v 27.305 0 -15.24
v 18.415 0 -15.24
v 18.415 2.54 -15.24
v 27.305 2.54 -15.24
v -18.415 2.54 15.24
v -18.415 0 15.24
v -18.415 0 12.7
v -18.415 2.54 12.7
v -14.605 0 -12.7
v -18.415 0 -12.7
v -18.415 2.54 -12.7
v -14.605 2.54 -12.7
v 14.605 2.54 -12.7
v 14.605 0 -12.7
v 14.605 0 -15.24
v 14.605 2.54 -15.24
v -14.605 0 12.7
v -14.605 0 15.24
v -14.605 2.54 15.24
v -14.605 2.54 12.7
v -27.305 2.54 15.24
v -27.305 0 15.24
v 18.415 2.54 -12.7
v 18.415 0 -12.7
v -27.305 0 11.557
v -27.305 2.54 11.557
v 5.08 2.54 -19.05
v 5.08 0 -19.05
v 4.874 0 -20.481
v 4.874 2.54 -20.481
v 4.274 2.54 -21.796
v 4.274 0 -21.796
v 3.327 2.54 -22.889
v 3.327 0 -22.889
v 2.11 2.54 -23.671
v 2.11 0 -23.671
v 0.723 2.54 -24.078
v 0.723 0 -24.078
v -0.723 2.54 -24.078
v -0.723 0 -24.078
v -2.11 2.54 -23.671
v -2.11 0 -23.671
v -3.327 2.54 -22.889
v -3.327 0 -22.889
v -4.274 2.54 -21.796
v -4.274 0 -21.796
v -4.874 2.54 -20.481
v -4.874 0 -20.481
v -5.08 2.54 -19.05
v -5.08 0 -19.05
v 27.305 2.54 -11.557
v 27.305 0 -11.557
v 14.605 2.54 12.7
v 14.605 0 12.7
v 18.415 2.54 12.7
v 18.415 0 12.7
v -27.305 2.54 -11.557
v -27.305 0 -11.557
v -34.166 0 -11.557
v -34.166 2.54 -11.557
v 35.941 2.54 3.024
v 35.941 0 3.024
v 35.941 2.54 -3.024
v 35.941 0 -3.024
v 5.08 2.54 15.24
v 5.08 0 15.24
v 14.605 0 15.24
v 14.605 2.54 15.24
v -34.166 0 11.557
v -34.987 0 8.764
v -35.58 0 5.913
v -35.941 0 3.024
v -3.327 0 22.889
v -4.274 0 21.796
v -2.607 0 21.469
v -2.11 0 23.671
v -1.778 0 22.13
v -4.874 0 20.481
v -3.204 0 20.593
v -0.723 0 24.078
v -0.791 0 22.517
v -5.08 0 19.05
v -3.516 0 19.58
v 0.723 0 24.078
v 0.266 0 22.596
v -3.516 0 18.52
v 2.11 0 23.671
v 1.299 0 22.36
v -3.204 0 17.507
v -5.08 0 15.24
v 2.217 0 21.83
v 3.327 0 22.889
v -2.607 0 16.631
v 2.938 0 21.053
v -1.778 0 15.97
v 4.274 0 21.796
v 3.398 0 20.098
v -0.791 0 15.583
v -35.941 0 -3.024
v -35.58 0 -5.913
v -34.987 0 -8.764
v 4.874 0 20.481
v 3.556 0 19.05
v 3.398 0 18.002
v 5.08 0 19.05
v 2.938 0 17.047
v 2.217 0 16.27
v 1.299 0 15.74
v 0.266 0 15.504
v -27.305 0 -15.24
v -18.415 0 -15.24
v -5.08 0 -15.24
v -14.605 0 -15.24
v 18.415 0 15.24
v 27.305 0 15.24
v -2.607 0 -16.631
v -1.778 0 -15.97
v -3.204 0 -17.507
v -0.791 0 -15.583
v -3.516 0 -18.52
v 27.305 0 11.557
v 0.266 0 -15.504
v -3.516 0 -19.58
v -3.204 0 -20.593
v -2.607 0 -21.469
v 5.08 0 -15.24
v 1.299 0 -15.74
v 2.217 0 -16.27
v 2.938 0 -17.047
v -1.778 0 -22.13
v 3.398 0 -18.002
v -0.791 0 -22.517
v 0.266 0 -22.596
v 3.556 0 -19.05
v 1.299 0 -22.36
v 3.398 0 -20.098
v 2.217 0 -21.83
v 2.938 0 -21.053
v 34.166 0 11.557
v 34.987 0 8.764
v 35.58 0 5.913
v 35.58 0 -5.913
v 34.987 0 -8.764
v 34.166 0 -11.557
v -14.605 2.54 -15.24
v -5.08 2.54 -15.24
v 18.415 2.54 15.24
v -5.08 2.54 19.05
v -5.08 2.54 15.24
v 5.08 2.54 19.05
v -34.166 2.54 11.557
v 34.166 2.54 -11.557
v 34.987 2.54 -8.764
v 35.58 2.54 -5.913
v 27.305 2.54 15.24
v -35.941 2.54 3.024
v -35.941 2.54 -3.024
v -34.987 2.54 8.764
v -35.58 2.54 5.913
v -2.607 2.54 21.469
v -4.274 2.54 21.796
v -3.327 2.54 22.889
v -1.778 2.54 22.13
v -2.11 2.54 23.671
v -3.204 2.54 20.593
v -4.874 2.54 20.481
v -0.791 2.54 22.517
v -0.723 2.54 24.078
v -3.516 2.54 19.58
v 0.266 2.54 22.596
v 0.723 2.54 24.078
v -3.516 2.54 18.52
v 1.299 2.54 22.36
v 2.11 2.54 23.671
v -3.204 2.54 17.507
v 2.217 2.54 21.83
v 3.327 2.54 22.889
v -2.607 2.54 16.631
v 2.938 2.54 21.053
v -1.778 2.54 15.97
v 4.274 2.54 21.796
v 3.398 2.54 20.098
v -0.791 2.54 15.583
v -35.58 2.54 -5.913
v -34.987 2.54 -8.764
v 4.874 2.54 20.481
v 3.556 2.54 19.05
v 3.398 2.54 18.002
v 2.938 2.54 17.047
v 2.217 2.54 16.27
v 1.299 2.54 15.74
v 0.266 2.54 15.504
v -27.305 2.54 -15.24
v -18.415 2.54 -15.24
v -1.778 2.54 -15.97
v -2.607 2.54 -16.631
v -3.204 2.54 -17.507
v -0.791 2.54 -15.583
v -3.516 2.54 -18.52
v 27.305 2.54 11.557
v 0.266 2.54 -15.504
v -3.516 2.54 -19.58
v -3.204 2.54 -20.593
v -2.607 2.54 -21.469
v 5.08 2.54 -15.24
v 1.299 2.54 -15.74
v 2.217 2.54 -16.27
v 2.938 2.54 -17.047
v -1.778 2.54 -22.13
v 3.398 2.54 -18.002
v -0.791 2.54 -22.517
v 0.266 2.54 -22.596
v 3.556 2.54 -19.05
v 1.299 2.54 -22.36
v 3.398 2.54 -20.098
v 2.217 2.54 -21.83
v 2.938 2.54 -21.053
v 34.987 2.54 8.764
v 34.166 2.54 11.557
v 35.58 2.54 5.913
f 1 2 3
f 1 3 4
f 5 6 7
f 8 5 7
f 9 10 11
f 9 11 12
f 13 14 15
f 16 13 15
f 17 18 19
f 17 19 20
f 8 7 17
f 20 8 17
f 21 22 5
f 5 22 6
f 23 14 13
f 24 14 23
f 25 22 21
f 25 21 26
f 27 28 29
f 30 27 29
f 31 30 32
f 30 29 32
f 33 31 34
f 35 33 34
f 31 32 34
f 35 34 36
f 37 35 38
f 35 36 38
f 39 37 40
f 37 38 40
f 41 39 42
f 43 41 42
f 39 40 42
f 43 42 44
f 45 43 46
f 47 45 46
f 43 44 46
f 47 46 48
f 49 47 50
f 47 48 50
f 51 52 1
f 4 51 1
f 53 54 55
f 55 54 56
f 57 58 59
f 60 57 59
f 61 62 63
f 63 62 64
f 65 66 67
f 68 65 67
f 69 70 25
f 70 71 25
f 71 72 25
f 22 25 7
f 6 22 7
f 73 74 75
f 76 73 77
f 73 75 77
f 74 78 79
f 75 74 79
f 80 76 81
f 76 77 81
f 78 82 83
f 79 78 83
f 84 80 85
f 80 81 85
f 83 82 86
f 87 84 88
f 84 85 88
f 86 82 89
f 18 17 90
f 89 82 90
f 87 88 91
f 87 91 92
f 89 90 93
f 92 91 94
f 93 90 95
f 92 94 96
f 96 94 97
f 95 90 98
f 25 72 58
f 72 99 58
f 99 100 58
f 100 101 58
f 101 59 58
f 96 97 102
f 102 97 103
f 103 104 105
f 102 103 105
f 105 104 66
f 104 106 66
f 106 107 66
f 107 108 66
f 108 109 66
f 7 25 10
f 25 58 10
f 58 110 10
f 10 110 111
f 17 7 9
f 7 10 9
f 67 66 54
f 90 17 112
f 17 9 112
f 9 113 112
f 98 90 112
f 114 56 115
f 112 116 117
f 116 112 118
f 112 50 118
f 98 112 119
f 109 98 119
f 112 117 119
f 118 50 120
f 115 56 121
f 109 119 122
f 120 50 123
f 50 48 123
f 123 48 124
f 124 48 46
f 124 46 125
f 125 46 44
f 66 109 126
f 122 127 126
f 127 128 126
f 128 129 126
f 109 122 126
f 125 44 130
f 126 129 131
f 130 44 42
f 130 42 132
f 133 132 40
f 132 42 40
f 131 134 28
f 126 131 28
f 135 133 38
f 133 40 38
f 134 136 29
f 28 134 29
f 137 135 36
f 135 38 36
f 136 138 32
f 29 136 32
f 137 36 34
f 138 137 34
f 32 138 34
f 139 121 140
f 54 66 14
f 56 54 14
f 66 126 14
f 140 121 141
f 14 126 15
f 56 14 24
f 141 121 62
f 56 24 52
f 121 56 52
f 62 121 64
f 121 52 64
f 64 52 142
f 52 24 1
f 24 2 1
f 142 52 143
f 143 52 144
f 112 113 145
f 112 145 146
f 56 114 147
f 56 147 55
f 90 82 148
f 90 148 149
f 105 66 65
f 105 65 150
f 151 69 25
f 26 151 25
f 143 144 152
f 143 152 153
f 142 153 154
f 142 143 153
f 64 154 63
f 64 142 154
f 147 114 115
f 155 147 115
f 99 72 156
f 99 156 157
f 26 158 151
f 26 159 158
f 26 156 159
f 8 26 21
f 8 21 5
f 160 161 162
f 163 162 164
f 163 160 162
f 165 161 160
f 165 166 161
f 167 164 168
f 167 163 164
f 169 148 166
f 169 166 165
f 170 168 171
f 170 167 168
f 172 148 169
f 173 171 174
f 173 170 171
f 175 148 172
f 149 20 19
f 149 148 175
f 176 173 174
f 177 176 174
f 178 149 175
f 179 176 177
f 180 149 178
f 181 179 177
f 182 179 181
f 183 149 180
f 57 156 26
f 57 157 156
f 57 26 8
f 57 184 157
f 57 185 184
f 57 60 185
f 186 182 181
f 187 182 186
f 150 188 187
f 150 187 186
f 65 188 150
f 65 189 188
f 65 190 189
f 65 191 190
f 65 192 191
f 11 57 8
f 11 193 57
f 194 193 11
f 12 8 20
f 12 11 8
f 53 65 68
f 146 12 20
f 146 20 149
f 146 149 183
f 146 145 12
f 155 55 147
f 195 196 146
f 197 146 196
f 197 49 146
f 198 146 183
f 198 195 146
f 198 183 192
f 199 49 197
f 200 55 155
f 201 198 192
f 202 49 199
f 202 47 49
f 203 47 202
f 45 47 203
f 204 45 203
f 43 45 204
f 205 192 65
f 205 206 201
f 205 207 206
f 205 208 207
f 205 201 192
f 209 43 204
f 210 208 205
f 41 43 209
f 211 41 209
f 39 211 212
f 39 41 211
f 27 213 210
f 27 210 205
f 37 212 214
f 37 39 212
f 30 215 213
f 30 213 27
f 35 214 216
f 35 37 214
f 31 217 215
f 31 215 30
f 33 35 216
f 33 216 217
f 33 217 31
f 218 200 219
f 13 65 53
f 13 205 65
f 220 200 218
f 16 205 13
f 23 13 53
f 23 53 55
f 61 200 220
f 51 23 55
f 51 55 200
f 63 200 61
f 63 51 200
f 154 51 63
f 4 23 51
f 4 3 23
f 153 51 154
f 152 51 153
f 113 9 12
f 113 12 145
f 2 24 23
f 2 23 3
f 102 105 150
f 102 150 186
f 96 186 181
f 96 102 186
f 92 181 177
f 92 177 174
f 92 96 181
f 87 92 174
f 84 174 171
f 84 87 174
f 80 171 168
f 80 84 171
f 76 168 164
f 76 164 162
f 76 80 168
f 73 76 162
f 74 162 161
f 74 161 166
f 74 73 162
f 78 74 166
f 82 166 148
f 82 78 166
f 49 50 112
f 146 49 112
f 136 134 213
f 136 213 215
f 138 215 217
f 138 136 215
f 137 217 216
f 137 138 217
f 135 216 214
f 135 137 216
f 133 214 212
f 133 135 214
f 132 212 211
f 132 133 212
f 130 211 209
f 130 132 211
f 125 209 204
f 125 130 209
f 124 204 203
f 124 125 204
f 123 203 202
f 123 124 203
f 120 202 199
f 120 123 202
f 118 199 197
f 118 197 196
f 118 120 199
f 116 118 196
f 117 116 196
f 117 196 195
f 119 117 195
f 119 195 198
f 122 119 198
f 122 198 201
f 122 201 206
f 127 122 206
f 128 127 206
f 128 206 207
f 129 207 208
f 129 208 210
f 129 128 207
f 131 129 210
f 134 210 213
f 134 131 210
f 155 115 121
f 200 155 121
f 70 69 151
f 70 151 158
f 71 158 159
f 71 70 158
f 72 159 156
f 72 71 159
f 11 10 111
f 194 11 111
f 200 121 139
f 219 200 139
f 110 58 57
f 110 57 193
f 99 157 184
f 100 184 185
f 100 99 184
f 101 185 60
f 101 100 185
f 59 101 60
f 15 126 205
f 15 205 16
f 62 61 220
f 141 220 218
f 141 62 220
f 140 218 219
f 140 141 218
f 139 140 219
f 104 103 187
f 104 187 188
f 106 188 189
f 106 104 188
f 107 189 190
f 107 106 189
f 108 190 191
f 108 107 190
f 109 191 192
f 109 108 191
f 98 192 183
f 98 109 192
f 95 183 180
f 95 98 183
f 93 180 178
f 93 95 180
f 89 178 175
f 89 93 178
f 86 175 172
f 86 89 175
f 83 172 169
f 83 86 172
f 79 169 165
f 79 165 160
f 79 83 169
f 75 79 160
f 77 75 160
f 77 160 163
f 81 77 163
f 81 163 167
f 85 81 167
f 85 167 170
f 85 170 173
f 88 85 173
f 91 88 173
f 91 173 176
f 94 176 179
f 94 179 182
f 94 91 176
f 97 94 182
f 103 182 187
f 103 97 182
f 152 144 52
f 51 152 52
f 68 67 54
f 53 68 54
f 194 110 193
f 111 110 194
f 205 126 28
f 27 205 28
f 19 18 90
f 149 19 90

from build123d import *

# Parameters (mm, degrees)
SKETCH1_W               = 54.61
SKETCH1_H               = 23.114
SKETCH1_W_2             = 8.636
SKETCH1_H_2             = 3.683
BOSS_EXTRUDE1_DEPTH     = 2.54
CUT_EXTRUDE1_DEPTH      = 3.54
CUT_EXTRUDE1_DEPTH_BACK = 1
SKETCH3_R               = 3.556
BOSS_EXTRUDE2_DEPTH     = 2.54
SKETCH4_W               = 3.81
SKETCH4_H               = 2.54
CUT_EXTRUDE3_DEPTH      = 3.54


with BuildPart() as part:
    # Sketch1 → Boss-Extrude1 (new body)
    with BuildSketch(Plane(origin=(0, 0, 0), x_dir=(1, 0, 0), z_dir=(0, 1, 0))):
        Rectangle(SKETCH1_W, SKETCH1_H)
        with Locations((-31.623, 0)):
            Rectangle(SKETCH1_W_2, SKETCH1_H)
        with Locations((31.623, 0)):
            Rectangle(SKETCH1_W_2, SKETCH1_H)
        with Locations((0, -13.3985)):
            Rectangle(SKETCH1_W, SKETCH1_H_2)
        with Locations((0, 13.3985)):
            Rectangle(SKETCH1_W, SKETCH1_H_2)
    extrude(amount=BOSS_EXTRUDE1_DEPTH)

    # Sketch2 → Cut-Extrude1 (cut, two sides)
    with BuildSketch(Plane(origin=(0, 0, 0), x_dir=(1, 0, 0), z_dir=(0, 1, 0))) as cut_extrude1_sk:
        with BuildLine():
            Line((-36.068, 36.068), (-36.068, -3.1e-08))
            ThreePointArc((-36.068, -3.1e-08), (-25.503927395, 25.503927373), (0, 36.068))
            Line((0, 36.068), (-36.068, 36.068))
        make_face()
        with BuildLine():
            ThreePointArc((0, 36.068), (25.503927384, 25.503927384), (36.068, 0))
            Line((36.068, 0), (36.068, 36.068))
            Line((36.068, 36.068), (0, 36.068))
        make_face()
        with BuildLine():
            ThreePointArc((36.068, 0), (25.503927365, -25.503927403), (-5.3e-08, -36.068))
            Line((-5.3e-08, -36.068), (36.068, -36.068))
            Line((36.068, -36.068), (36.068, 0))
        make_face()
        with BuildLine():
            Line((-36.068, -3.1e-08), (-36.068, -36.068))
            Line((-36.068, -36.068), (-5.3e-08, -36.068))
            ThreePointArc((-5.3e-08, -36.068), (-25.503927391, -25.503927376), (-36.068, -3.1e-08))
        make_face()
    extrude(amount=CUT_EXTRUDE1_DEPTH, mode=Mode.SUBTRACT)
    extrude(cut_extrude1_sk.sketch, amount=-CUT_EXTRUDE1_DEPTH_BACK, mode=Mode.SUBTRACT)

    # Sketch3 → Boss-Extrude2 (add)
    with BuildSketch(Plane(origin=(0, 0, 0), x_dir=(1, 0, 0), z_dir=(0, 1, 0))):
        with BuildLine():
            Line((-5.08, 19.05), (-5.08, 15.24))
            Line((-5.08, 15.24), (5.08, 15.24))
            Line((5.08, 15.24), (5.08, 19.05))
            ThreePointArc((5.08, 19.05), (0, 24.13), (-5.08, 19.05))
        make_face()
        with Locations((0, 19.05)):
            Circle(SKETCH3_R, mode=Mode.SUBTRACT)
        with BuildLine():
            Line((-5.08, -19.05), (-5.08, -15.24))
            Line((-5.08, -15.24), (5.08, -15.24))
            Line((5.08, -15.24), (5.08, -19.05))
            ThreePointArc((5.08, -19.05), (0, -24.13), (-5.08, -19.05))
        make_face()
        with Locations((0, -19.05)):
            Circle(SKETCH3_R, mode=Mode.SUBTRACT)
    extrude(amount=BOSS_EXTRUDE2_DEPTH)

    # Sketch4 → Cut-Extrude3 (cut, through all)
    with BuildSketch(Plane(origin=(0, 0, 0), x_dir=(1, 0, 0), z_dir=(0, 1, 0))):
        with Locations((-16.51, 13.97)):
            Rectangle(SKETCH4_W, SKETCH4_H)
        with Locations((16.51, 13.97)):
            Rectangle(SKETCH4_W, SKETCH4_H)
        with Locations((-16.51, -13.97)):
            Rectangle(SKETCH4_W, SKETCH4_H)
        with Locations((16.51, -13.97)):
            Rectangle(SKETCH4_W, SKETCH4_H)
    extrude(amount=CUT_EXTRUDE3_DEPTH, mode=Mode.SUBTRACT)


solid = part.part
